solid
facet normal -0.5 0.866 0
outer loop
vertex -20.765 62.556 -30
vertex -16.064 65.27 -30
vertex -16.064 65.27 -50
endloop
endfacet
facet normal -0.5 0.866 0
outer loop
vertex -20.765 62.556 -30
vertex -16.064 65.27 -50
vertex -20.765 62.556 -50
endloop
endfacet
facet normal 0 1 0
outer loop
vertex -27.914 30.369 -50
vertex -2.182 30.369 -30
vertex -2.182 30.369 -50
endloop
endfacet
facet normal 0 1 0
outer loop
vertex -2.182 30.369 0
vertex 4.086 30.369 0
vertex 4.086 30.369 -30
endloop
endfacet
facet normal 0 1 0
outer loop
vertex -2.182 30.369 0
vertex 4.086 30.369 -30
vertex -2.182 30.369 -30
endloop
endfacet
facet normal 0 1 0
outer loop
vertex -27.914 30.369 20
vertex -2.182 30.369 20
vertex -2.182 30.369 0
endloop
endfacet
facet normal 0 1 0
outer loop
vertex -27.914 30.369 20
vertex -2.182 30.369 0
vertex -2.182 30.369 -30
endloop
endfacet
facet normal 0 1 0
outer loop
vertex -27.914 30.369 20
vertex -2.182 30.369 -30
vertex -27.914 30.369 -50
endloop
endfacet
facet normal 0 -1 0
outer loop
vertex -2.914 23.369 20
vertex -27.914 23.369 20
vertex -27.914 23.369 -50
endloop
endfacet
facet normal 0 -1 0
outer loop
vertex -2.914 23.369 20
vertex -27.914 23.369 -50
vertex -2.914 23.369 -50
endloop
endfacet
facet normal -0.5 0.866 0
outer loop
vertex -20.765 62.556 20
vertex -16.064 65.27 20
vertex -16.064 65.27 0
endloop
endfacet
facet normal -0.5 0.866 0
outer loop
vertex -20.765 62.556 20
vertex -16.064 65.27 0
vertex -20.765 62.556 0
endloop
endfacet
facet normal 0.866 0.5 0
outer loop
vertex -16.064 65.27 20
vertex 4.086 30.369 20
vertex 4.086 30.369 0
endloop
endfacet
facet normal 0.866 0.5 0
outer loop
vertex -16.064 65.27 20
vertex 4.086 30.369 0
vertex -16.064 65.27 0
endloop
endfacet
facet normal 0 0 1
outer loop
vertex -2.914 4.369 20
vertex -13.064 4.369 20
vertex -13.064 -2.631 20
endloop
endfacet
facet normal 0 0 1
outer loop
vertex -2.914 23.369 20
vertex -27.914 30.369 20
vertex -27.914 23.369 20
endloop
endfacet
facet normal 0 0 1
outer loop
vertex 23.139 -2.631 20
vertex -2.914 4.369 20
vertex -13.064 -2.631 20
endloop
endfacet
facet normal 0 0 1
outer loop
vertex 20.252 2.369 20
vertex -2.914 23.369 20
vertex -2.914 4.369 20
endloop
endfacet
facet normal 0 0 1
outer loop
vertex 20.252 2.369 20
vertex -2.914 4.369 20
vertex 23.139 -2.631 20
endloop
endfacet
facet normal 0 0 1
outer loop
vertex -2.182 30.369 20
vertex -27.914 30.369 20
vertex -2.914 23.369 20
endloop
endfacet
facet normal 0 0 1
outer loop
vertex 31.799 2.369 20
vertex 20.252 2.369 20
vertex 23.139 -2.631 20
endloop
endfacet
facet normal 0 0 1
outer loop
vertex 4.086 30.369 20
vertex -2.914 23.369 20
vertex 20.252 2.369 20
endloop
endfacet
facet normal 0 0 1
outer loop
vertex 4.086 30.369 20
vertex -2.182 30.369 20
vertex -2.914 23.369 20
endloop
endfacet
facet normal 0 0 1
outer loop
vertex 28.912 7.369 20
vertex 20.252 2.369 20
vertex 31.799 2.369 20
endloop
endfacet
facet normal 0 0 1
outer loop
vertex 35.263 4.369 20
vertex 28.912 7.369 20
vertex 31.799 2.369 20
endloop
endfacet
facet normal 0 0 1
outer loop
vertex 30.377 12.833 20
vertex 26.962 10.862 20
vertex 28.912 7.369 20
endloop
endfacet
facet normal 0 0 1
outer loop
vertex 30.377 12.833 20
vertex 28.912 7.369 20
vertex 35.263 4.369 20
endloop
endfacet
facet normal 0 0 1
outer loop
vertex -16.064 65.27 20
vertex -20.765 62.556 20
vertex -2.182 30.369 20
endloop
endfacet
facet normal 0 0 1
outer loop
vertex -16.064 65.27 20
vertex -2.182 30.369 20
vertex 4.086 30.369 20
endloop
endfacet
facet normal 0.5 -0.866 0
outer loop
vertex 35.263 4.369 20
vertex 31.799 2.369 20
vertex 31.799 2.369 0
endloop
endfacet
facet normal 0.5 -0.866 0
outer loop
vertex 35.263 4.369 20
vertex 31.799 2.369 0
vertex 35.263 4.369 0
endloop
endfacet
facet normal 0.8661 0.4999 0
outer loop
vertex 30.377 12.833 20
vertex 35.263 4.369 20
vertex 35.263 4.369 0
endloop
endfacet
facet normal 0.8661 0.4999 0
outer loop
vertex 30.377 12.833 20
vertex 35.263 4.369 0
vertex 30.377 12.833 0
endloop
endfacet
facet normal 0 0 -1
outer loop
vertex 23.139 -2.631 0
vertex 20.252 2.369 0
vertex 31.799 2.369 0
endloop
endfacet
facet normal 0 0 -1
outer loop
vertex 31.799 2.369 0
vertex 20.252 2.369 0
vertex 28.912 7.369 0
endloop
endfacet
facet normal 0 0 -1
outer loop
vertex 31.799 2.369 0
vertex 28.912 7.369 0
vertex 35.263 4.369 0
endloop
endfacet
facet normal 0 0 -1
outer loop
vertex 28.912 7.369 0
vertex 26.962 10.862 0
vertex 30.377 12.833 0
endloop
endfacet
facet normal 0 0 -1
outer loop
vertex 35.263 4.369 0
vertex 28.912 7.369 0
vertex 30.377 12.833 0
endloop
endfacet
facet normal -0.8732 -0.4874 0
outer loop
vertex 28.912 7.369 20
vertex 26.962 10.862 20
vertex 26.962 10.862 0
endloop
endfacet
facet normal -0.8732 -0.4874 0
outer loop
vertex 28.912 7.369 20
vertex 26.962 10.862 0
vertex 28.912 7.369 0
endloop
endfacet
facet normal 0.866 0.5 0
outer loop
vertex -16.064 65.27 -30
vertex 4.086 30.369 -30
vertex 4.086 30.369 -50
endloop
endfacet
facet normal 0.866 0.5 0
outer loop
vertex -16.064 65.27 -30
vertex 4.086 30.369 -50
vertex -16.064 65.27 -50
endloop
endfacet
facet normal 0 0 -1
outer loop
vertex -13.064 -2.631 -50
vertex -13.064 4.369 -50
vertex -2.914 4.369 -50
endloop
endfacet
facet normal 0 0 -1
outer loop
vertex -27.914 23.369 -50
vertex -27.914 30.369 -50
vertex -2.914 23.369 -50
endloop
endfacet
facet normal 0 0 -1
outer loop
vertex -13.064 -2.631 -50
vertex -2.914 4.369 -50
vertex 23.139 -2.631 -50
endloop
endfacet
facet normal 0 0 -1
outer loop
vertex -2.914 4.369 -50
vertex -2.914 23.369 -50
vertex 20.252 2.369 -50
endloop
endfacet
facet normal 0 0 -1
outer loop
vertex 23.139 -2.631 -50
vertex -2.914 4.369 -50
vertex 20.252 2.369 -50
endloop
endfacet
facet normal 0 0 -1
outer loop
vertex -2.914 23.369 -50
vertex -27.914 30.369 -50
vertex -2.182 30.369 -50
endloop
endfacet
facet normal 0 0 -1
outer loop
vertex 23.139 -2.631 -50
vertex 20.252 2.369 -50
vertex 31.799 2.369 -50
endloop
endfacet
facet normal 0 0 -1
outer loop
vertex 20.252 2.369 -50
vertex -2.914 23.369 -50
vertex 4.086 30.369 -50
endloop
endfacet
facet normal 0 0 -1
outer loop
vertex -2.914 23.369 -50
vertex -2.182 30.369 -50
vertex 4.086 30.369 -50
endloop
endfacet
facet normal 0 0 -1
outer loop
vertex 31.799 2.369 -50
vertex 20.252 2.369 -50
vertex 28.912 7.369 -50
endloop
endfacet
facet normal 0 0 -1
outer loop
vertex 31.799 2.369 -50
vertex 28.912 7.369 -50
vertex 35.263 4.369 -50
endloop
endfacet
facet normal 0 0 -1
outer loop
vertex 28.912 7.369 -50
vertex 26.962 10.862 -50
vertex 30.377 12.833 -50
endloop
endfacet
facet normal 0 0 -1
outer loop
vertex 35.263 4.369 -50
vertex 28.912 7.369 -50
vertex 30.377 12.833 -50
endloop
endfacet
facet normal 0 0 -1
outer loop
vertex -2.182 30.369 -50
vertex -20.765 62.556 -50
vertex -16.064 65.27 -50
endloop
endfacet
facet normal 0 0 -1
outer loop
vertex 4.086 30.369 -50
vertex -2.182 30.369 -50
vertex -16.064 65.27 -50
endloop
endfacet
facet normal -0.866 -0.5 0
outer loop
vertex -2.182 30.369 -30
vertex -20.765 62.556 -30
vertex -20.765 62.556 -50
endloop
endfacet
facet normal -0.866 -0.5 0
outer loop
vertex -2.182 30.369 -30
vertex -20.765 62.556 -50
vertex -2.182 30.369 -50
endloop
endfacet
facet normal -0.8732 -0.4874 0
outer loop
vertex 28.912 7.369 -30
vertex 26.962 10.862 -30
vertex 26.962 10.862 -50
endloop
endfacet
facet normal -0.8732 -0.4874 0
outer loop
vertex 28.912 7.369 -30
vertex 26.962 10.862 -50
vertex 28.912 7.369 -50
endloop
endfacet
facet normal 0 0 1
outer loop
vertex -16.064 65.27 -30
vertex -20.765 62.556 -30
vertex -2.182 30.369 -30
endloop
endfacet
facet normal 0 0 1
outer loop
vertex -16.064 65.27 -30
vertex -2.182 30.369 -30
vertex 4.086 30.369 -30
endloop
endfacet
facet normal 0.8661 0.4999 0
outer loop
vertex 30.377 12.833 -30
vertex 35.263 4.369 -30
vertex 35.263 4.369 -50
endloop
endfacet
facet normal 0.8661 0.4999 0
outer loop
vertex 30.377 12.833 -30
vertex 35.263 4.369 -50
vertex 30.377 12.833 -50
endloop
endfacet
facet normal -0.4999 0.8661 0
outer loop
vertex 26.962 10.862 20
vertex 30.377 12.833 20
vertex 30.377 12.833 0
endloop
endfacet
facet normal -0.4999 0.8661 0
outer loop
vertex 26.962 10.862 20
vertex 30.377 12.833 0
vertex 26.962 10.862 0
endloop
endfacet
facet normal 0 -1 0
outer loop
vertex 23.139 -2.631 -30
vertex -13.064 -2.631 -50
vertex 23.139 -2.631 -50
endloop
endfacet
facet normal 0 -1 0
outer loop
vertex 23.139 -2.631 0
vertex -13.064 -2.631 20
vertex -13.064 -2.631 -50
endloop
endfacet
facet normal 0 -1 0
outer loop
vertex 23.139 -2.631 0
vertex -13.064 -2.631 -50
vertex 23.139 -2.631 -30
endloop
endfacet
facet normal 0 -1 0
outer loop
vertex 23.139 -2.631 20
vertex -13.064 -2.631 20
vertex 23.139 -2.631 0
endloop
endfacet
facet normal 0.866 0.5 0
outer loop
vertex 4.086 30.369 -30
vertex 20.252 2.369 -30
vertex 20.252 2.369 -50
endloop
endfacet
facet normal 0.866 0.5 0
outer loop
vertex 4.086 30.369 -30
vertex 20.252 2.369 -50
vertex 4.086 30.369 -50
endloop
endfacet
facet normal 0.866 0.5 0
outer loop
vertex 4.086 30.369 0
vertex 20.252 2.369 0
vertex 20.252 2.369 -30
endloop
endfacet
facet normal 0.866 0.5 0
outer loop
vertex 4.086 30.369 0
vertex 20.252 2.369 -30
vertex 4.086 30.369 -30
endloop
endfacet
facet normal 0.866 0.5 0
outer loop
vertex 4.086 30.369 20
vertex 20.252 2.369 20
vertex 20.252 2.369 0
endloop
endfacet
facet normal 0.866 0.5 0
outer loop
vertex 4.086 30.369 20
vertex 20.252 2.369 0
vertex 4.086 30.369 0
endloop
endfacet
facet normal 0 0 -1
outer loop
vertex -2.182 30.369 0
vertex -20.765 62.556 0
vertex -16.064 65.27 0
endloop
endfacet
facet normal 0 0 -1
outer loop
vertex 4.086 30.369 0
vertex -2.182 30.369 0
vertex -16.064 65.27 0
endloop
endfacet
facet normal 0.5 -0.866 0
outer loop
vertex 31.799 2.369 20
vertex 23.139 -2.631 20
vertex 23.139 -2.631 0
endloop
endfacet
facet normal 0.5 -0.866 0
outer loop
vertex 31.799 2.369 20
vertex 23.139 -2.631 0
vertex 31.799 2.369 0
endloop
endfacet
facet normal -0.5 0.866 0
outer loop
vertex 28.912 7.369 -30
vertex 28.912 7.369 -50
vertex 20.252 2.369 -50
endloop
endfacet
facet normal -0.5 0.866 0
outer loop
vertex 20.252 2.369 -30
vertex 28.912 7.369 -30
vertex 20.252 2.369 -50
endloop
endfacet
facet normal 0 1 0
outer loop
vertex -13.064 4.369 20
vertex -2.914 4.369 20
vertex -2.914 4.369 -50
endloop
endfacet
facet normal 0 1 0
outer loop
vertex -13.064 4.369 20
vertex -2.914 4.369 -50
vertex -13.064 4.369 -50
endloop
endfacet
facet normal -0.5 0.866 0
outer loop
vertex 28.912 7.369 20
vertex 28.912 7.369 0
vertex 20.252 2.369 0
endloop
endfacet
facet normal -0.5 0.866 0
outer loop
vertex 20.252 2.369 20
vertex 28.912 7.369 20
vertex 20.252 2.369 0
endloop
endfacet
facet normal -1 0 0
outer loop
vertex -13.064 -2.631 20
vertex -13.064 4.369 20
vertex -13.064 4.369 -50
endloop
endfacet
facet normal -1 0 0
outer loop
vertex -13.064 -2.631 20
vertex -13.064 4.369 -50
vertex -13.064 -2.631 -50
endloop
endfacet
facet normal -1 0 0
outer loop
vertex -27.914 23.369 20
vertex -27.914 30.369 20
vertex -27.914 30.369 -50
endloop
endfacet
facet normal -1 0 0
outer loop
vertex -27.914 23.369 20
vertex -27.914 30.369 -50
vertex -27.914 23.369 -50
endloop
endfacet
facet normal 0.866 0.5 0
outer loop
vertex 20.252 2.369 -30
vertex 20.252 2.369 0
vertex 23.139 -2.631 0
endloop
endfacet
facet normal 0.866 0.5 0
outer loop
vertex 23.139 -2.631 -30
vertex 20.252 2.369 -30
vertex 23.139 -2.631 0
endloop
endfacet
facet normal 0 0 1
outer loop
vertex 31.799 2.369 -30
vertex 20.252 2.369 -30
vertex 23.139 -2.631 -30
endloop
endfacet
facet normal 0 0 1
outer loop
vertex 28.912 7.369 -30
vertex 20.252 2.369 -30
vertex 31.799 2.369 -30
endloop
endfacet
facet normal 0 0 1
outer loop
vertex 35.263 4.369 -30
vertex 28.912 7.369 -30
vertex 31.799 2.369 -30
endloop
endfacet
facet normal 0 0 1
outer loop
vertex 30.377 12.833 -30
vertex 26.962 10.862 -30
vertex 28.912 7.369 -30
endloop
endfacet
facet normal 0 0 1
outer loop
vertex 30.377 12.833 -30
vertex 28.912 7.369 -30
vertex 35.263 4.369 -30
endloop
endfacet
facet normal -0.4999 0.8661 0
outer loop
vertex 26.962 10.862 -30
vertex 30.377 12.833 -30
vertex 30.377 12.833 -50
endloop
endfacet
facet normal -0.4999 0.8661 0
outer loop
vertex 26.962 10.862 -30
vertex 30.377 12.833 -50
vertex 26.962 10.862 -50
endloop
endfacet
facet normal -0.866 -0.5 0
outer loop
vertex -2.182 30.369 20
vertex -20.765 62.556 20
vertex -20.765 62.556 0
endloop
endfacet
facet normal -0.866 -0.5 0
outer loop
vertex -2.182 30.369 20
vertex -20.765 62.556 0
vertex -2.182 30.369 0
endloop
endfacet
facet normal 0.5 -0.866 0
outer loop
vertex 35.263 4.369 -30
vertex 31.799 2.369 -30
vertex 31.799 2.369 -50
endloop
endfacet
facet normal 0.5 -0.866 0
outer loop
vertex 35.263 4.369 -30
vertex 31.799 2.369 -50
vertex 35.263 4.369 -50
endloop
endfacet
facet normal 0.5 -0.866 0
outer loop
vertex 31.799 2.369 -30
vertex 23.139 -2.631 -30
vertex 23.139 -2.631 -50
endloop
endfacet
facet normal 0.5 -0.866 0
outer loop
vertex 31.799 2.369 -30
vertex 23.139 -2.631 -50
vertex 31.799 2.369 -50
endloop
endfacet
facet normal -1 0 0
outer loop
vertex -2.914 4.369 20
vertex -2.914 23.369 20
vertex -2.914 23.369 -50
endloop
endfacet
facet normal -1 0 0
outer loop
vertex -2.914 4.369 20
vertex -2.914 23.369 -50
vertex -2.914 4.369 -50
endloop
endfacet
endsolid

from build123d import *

# Parameters (mm, degrees)
F1_DEPTH = 20
F2_DEPTH = 50
F3_DEPTH = 30


with BuildPart() as f1:
    # F0 (on Top) → F1 (new body)
    with BuildSketch(Plane.XY):
        Polygon((-20.765196, 62.555887), (-2.182231, 30.369248), (4.086395, 30.369248), (-16.063726, 65.270282), align=None)
        Polygon((-27.913605, 30.369248), (-27.913605, 23.369248), (-3.063605, 23.369248), (-2.913605, 23.369248), (-2.913605, 4.369248), (-3.063605, 4.369248), (-13.063605, 4.369248), (-13.063605, -2.630752), (4.086395, -2.630752), (4.086395, 30.369248), (-2.182231, 30.369248), align=None)
        Polygon((20.252203, 2.369248), (4.086395, 30.369248), (4.086395, -2.630752), (23.138954, -2.630752), align=None)
        Polygon((28.912457, 7.369248), (20.252203, 2.369248), (23.138954, -2.630752), (31.799208, 2.369248), align=None)
        Polygon((26.96224, 10.861619), (28.912457, 7.369248), (31.799208, 2.369248), (35.26331, 4.369248), (30.376763, 12.832995), align=None)
    extrude(amount=F1_DEPTH)

    # F0 (on Top) → F2 (join)
    with BuildSketch(Plane.XY):
        Polygon((-20.765196, 62.555887), (-2.182231, 30.369248), (4.086395, 30.369248), (-16.063726, 65.270282), align=None)
        Polygon((-27.913605, 30.369248), (-27.913605, 23.369248), (-3.063605, 23.369248), (-2.913605, 23.369248), (-2.913605, 4.369248), (-3.063605, 4.369248), (-13.063605, 4.369248), (-13.063605, -2.630752), (4.086395, -2.630752), (4.086395, 30.369248), (-2.182231, 30.369248), align=None)
        Polygon((20.252203, 2.369248), (4.086395, 30.369248), (4.086395, -2.630752), (23.138954, -2.630752), align=None)
        Polygon((28.912457, 7.369248), (20.252203, 2.369248), (23.138954, -2.630752), (31.799208, 2.369248), align=None)
        Polygon((26.96224, 10.861619), (28.912457, 7.369248), (31.799208, 2.369248), (35.26331, 4.369248), (30.376763, 12.832995), align=None)
    extrude(amount=-F2_DEPTH)

    # F0 (on Top) → F3 (cut)
    with BuildSketch(Plane.XY):
        Polygon((-20.765196, 62.555887), (-2.182231, 30.369248), (4.086395, 30.369248), (-16.063726, 65.270282), align=None)
        Polygon((28.912457, 7.369248), (20.252203, 2.369248), (23.138954, -2.630752), (31.799208, 2.369248), align=None)
        Polygon((26.96224, 10.861619), (28.912457, 7.369248), (31.799208, 2.369248), (35.26331, 4.369248), (30.376763, 12.832995), align=None)
    extrude(amount=-F3_DEPTH, mode=Mode.SUBTRACT)


solid = f1.part
